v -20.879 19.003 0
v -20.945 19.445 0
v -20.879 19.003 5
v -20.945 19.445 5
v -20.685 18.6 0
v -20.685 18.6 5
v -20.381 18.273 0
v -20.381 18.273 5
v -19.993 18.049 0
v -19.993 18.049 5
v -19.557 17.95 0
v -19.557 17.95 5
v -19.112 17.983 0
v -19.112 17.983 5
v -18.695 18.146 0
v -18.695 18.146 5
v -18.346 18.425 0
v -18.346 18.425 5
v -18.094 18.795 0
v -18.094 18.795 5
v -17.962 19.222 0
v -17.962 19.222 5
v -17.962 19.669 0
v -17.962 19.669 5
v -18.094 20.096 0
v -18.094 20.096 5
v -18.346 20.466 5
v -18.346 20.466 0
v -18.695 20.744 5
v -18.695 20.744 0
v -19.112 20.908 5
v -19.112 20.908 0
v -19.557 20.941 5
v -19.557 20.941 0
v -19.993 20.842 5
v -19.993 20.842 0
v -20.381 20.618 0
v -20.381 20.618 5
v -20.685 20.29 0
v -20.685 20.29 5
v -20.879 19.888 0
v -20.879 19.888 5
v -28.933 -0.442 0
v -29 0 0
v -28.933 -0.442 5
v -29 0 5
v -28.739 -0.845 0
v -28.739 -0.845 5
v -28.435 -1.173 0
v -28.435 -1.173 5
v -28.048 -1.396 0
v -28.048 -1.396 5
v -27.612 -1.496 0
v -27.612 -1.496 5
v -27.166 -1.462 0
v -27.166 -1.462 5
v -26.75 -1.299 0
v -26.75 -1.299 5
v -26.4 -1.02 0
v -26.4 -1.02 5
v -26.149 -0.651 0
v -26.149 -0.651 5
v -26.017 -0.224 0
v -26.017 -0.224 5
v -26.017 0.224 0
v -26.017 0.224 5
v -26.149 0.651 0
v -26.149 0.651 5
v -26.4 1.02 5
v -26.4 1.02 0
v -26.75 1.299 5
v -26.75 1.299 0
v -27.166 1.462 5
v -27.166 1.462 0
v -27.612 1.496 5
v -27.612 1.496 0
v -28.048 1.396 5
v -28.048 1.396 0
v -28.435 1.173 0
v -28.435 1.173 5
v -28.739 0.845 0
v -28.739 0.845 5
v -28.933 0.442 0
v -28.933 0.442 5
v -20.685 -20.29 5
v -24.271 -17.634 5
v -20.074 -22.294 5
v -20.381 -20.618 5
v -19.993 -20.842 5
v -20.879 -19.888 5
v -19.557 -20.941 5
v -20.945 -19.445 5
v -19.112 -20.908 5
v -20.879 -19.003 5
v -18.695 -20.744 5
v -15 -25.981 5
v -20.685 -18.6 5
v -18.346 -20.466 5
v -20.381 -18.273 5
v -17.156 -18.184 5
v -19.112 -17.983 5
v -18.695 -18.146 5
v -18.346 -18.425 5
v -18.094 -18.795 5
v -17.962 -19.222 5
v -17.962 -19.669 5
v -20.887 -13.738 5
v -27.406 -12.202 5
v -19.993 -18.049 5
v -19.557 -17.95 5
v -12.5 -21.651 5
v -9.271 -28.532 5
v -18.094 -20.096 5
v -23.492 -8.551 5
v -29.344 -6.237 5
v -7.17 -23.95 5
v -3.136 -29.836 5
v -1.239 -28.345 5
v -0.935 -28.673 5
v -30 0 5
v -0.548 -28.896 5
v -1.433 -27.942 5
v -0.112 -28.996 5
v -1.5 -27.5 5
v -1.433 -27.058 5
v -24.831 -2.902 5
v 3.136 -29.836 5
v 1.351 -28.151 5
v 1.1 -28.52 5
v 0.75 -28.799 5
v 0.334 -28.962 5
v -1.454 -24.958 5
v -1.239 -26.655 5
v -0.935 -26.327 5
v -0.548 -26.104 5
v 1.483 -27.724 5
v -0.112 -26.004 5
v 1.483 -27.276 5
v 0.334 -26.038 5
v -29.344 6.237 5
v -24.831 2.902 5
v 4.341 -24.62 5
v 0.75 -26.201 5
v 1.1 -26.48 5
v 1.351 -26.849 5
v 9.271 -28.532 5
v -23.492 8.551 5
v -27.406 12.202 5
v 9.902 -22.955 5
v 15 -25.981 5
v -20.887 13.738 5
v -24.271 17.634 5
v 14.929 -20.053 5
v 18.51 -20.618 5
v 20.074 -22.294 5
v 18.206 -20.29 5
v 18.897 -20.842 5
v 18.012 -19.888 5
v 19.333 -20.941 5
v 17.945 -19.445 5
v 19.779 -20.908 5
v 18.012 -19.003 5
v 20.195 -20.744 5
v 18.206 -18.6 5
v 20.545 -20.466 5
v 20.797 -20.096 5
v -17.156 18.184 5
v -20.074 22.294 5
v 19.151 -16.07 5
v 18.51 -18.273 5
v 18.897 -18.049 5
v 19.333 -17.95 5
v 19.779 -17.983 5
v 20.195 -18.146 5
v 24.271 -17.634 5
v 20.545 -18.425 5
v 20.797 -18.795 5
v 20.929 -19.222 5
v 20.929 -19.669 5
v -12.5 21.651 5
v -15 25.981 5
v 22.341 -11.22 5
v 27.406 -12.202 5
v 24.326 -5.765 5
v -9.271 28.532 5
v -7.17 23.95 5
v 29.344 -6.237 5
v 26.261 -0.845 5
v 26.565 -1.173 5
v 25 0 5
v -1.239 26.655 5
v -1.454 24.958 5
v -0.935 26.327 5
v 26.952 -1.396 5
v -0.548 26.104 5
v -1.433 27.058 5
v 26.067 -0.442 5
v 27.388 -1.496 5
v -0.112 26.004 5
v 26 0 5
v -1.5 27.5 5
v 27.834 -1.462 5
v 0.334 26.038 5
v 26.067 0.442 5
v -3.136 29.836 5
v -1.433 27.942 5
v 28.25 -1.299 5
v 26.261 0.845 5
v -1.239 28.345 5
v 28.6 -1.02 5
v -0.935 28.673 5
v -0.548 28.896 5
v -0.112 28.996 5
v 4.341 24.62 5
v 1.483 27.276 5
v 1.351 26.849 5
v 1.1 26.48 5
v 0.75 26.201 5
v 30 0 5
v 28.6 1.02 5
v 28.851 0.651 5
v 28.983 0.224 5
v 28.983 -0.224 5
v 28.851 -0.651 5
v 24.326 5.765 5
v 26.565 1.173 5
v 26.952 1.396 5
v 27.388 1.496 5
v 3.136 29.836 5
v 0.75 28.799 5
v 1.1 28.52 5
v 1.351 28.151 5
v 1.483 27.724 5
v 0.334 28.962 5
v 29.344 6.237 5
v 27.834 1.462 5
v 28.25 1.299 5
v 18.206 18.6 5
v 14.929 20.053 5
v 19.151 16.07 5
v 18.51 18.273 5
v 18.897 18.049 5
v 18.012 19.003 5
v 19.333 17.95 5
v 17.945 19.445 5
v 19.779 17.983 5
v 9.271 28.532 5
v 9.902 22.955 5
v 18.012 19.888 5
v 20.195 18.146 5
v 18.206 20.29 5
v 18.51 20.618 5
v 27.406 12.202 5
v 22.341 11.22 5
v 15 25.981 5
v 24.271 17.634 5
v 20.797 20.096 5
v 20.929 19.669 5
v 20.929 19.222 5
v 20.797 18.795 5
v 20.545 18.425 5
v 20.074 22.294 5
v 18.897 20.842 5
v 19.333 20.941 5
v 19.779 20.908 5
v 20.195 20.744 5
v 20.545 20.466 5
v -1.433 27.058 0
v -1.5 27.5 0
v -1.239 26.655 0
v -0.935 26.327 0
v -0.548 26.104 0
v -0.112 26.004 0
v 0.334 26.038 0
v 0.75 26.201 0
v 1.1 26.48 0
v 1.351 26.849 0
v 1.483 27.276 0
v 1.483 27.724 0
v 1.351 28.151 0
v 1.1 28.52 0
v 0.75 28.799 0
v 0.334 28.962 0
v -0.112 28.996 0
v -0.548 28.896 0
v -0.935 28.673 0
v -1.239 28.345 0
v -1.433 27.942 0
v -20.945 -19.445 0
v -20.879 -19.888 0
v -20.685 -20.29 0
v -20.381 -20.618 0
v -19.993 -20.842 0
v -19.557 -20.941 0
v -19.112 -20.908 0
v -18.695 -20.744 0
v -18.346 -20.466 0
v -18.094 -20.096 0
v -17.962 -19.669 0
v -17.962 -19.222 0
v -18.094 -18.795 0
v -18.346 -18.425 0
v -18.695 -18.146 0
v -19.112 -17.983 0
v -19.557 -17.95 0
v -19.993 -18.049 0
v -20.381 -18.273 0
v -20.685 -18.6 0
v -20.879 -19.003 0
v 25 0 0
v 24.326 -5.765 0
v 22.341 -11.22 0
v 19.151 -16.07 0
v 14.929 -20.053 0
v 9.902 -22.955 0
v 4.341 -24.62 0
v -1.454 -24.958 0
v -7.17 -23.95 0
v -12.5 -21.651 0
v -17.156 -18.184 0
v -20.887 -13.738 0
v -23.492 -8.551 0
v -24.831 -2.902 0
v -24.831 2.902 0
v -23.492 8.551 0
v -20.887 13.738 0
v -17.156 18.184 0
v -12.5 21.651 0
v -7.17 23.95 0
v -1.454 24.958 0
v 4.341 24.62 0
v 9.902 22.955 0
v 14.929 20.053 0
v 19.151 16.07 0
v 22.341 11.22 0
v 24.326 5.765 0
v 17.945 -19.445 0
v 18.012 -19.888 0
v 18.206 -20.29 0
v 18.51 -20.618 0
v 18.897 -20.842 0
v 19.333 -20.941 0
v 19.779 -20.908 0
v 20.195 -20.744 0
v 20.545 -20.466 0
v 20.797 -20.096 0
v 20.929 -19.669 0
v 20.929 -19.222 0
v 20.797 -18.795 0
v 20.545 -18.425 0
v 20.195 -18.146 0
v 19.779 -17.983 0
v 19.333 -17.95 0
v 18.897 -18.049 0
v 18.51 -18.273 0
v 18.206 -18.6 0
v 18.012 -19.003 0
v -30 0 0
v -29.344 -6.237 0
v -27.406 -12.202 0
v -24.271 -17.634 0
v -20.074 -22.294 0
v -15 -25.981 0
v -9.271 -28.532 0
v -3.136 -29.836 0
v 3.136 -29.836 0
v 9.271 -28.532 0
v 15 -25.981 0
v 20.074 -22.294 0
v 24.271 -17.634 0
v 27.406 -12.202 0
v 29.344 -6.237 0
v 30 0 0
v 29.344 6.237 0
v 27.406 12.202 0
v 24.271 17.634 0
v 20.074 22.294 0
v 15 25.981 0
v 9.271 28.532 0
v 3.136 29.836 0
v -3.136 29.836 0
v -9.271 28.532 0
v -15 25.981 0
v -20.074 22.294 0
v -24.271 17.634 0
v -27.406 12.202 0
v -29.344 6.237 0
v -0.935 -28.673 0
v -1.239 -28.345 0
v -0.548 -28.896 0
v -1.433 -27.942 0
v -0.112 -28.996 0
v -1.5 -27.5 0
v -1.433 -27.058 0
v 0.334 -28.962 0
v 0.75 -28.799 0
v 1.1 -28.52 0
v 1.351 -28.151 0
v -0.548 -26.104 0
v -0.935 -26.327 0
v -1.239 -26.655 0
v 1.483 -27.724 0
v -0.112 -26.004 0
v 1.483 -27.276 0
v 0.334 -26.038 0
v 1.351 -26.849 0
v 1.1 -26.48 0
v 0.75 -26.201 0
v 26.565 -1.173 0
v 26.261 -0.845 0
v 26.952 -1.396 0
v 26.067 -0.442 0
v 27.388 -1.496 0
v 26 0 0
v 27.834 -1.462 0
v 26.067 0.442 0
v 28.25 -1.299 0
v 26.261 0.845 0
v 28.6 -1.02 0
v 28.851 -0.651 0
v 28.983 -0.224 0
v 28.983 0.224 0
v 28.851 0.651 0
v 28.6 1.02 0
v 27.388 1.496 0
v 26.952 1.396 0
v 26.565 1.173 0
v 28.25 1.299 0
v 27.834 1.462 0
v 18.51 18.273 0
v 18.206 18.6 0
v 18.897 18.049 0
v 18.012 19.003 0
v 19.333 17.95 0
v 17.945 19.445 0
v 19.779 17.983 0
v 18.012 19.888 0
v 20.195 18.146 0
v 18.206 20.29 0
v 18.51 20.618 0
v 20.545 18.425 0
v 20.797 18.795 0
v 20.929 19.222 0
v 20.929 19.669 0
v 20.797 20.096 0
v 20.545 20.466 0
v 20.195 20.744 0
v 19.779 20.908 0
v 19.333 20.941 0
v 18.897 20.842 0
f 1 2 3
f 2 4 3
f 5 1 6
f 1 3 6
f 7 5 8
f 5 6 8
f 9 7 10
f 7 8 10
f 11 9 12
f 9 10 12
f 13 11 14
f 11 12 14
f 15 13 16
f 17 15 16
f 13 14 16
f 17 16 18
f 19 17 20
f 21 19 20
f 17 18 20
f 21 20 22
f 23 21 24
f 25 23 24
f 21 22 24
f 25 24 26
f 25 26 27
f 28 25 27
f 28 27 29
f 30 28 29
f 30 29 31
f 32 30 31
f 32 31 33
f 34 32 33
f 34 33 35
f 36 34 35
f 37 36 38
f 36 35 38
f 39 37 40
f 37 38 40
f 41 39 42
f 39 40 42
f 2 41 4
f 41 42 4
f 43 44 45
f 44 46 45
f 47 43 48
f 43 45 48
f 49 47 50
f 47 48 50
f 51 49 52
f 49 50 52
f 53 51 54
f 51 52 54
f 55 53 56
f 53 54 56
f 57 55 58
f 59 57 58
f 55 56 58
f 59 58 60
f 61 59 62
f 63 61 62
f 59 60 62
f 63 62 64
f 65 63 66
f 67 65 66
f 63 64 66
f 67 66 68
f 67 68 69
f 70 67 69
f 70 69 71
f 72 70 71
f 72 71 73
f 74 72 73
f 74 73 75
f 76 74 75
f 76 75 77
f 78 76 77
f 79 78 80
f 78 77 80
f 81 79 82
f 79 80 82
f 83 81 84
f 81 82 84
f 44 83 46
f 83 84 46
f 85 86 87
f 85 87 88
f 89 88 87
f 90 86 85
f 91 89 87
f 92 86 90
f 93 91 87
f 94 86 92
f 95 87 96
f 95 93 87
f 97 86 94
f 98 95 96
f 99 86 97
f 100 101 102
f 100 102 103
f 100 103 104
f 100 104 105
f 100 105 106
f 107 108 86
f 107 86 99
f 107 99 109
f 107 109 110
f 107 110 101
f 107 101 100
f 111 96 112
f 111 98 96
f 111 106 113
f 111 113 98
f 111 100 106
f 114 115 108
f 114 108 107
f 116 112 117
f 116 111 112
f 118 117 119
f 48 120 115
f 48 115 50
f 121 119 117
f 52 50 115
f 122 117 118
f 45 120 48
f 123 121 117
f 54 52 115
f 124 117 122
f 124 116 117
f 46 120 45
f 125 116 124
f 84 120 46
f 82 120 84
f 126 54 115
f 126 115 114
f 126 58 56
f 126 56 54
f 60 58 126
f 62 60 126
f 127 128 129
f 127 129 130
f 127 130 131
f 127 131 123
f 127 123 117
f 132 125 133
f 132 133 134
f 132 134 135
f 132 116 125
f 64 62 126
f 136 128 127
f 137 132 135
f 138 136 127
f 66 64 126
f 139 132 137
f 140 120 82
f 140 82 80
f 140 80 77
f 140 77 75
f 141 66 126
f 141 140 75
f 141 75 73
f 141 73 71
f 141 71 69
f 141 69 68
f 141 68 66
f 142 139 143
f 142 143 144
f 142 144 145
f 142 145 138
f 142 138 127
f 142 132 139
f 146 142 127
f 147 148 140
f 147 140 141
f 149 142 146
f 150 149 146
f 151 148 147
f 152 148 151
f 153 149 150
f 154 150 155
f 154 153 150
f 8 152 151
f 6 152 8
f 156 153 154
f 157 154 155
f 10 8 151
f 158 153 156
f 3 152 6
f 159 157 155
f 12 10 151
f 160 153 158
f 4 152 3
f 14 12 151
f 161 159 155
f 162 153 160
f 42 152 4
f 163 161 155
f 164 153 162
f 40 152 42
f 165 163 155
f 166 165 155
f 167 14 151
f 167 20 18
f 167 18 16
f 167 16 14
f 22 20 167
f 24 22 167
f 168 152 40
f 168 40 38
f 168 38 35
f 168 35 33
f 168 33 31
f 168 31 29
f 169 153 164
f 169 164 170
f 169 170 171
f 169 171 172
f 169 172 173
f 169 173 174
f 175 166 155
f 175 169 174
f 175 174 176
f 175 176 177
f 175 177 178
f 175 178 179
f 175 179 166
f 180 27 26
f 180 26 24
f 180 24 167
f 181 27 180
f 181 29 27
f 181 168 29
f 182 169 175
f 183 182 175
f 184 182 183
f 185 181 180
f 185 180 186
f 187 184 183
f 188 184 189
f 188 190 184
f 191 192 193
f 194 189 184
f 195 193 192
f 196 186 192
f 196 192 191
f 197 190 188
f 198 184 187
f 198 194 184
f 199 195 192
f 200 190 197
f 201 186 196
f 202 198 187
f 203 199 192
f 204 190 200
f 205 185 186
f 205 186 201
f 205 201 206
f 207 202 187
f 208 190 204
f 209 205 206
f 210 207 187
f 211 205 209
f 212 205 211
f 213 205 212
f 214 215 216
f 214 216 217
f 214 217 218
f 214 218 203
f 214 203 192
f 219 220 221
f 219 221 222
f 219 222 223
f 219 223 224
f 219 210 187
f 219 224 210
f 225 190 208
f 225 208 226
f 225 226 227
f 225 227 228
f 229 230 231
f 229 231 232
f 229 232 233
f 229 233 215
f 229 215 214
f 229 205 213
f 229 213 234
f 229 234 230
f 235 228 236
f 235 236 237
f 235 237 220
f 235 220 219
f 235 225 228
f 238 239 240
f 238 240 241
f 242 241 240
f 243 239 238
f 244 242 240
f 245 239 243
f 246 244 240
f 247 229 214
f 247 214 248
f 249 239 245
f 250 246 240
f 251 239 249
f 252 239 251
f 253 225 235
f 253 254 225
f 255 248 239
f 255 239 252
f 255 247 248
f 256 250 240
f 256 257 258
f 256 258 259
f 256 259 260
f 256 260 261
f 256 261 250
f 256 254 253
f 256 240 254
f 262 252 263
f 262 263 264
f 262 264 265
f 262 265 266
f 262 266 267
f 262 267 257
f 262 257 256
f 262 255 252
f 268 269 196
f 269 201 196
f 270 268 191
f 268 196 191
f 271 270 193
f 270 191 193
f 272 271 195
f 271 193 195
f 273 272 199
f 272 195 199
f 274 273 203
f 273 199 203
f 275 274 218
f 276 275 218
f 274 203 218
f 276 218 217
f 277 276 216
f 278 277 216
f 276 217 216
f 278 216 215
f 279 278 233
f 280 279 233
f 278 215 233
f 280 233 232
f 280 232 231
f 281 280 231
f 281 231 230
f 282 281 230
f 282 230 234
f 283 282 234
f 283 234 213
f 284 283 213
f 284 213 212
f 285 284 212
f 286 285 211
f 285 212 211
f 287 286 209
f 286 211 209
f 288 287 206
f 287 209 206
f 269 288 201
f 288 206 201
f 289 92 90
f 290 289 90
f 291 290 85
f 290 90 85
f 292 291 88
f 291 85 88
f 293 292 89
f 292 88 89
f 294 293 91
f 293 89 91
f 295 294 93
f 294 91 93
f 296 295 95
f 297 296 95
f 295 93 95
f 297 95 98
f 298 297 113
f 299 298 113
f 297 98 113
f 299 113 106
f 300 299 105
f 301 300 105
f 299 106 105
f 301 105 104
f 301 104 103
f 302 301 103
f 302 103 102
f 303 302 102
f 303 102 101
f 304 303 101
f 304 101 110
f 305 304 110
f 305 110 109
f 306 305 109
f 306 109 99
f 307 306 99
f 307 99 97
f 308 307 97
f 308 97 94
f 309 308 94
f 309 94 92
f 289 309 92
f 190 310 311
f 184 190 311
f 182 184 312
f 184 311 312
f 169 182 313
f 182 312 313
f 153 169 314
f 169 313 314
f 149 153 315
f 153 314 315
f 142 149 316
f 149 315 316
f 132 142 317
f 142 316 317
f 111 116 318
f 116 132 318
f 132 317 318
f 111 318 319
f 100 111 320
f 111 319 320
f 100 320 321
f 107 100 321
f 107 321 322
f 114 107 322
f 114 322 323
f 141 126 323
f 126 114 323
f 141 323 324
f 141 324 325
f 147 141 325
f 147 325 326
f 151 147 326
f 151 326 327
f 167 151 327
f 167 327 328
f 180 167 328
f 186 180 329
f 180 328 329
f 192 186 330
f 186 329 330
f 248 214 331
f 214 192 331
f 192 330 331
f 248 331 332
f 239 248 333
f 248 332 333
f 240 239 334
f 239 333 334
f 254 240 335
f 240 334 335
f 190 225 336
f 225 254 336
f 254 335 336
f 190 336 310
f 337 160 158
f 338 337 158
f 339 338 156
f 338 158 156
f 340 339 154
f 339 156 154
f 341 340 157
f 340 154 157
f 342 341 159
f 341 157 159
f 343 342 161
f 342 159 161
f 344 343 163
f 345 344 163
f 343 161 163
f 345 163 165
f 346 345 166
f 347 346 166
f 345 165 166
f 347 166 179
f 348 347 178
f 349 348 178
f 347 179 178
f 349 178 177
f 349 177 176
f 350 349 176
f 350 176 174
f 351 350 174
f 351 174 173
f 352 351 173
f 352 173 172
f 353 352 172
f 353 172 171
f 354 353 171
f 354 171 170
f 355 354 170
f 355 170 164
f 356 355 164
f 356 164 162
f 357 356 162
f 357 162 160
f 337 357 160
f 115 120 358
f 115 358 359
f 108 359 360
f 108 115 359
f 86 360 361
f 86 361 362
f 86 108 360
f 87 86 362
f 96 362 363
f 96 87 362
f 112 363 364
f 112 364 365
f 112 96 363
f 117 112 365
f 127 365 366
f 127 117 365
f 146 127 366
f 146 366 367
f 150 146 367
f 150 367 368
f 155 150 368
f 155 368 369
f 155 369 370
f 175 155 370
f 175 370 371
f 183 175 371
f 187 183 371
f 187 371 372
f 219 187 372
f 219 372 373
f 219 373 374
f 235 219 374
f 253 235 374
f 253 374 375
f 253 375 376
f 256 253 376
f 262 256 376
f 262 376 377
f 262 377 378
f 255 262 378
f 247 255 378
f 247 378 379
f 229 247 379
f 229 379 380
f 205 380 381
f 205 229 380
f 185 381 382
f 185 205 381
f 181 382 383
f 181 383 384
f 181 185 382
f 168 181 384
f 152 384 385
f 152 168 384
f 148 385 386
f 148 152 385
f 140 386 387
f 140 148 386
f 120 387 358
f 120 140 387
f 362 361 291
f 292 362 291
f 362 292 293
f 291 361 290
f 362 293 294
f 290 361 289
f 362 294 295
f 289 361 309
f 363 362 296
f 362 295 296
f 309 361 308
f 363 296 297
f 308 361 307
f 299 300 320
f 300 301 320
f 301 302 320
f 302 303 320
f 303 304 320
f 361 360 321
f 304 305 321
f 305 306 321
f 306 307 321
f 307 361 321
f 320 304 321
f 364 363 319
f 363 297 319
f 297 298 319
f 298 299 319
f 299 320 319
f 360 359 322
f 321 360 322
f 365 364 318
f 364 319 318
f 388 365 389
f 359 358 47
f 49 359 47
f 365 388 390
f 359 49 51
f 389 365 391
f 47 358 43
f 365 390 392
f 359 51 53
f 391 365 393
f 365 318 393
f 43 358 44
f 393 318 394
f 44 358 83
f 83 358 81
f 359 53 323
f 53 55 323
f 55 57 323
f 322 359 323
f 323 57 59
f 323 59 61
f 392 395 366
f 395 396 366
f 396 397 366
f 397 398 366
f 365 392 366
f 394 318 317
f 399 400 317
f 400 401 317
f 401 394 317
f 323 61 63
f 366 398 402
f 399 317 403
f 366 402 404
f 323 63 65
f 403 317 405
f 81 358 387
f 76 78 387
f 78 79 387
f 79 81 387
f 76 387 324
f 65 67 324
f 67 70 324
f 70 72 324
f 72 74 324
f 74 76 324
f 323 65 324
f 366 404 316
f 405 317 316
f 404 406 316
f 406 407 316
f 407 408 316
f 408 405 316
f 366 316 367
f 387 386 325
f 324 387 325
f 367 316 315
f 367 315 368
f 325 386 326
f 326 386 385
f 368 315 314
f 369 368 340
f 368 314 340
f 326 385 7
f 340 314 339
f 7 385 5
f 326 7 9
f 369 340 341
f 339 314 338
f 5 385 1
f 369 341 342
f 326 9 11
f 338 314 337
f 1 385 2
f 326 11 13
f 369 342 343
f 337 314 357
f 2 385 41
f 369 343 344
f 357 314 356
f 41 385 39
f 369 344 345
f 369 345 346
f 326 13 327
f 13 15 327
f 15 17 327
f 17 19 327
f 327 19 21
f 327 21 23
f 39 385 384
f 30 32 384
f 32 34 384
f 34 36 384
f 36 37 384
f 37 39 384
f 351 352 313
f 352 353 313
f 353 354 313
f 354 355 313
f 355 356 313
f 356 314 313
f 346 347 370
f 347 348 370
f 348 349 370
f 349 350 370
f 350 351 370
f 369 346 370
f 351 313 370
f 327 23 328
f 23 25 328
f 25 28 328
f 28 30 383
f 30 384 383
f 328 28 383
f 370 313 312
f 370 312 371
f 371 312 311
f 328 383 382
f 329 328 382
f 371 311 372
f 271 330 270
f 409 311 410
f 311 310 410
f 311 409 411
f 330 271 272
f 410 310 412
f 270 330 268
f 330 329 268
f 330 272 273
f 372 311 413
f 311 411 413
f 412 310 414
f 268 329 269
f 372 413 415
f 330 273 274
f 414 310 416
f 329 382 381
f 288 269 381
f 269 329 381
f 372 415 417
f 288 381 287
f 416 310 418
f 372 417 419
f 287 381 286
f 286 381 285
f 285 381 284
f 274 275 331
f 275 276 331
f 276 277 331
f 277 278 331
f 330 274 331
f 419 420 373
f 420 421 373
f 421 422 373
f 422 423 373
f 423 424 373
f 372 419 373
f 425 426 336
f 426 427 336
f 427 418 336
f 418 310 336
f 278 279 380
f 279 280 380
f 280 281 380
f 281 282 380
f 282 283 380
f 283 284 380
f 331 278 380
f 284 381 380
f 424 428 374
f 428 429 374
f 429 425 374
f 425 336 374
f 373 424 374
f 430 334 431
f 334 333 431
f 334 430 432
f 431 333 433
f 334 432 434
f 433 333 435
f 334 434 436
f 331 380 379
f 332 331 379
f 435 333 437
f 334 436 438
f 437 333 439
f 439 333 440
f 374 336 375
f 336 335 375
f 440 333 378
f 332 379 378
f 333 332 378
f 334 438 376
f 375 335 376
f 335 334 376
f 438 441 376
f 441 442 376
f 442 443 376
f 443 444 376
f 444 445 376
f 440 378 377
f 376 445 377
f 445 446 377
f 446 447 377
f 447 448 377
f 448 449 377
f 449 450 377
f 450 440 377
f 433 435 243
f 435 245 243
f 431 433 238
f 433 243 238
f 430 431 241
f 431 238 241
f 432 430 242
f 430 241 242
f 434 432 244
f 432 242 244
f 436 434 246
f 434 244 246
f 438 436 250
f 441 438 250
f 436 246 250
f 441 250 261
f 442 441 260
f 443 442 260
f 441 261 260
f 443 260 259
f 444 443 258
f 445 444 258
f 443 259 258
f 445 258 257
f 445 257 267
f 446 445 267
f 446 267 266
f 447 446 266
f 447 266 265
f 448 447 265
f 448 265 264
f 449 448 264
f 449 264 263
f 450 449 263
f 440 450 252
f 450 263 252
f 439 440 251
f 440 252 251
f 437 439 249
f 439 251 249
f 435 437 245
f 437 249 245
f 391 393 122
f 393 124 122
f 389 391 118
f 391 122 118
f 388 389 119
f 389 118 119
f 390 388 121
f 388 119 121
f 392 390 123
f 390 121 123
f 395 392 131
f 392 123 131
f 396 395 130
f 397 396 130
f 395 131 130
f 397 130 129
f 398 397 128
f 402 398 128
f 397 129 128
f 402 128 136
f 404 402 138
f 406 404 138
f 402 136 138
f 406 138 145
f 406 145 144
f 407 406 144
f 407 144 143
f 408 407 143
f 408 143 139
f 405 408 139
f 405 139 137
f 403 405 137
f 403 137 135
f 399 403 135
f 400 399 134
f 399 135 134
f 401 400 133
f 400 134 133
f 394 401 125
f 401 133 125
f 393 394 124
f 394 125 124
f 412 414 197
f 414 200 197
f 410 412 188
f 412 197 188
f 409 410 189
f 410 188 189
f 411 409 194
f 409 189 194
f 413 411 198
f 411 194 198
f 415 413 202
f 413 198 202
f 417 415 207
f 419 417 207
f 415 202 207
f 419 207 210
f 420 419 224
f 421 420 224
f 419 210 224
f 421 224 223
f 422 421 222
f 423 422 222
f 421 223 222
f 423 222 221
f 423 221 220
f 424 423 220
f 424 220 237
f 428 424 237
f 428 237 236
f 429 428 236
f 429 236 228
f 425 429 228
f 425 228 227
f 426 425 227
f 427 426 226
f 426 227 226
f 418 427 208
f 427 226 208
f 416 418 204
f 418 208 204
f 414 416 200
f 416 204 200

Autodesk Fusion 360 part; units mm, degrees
sketch "スケッチ1" plane through (0, 0, 0) normal (0, 0, 1) x (1, 0, 0)
  circle A0 centre (0, 0) radius 25
  circle A1 centre (0, 0) radius 27.5
  dimension "d1" = 55
extrude "押し出し1" add sketch "スケッチ1" along normal blind 5
sketch "スケッチ2" plane through (0, 0, 5) normal (0, 0, 1) x (-1, 0, 0)
  circle A0 centre (0, 0) radius 25
  circle A1 centre (0, 0) radius 27.5
  circle A2 centre (0, 0) radius 30
extrude "押し出し2" add sketch "スケッチ2" against normal blind 5 contours A2
sketch "スケッチ3" plane through (0, 0, 5) normal (0, 0, 1) x (-1, 0, 0)
  circle A0 centre (0, 0) radius 30
  circle A1 centre (0, 0) radius 25
  circle A2 centre (0, 0) radius 27.5
  circle A3 centre (-27.5, 0) radius 1.5
  circle A4 centre (-19.4454, -19.4454) radius 1.5
  circle A5 centre (0, -27.5) radius 1.5
  circle A6 centre (19.4454, -19.4454) radius 1.5
  circle A7 centre (27.5, 0) radius 1.5
  circle A8 centre (19.4454, 19.4454) radius 1.5
  circle A9 centre (0, 27.5) radius 1.5
  circle A10 centre (-19.4454, 19.4454) radius 1.5
  dimension "d6" = 55
  dimension "d7" = 3
  dimension "d9" = 360
extrude "押し出し3" cut sketch "スケッチ3" against normal blind 6 contours A2 A7 | A2 A7 | A2 A8 | A2 A8 | A2 A6 | A2 A6 | A2 A9 | A2 A9 | A2 A5 | A2 A5 | A2 A10 | A2 A10 | A2 A4 | A2 A4 | A2 A3 | A2 A3
